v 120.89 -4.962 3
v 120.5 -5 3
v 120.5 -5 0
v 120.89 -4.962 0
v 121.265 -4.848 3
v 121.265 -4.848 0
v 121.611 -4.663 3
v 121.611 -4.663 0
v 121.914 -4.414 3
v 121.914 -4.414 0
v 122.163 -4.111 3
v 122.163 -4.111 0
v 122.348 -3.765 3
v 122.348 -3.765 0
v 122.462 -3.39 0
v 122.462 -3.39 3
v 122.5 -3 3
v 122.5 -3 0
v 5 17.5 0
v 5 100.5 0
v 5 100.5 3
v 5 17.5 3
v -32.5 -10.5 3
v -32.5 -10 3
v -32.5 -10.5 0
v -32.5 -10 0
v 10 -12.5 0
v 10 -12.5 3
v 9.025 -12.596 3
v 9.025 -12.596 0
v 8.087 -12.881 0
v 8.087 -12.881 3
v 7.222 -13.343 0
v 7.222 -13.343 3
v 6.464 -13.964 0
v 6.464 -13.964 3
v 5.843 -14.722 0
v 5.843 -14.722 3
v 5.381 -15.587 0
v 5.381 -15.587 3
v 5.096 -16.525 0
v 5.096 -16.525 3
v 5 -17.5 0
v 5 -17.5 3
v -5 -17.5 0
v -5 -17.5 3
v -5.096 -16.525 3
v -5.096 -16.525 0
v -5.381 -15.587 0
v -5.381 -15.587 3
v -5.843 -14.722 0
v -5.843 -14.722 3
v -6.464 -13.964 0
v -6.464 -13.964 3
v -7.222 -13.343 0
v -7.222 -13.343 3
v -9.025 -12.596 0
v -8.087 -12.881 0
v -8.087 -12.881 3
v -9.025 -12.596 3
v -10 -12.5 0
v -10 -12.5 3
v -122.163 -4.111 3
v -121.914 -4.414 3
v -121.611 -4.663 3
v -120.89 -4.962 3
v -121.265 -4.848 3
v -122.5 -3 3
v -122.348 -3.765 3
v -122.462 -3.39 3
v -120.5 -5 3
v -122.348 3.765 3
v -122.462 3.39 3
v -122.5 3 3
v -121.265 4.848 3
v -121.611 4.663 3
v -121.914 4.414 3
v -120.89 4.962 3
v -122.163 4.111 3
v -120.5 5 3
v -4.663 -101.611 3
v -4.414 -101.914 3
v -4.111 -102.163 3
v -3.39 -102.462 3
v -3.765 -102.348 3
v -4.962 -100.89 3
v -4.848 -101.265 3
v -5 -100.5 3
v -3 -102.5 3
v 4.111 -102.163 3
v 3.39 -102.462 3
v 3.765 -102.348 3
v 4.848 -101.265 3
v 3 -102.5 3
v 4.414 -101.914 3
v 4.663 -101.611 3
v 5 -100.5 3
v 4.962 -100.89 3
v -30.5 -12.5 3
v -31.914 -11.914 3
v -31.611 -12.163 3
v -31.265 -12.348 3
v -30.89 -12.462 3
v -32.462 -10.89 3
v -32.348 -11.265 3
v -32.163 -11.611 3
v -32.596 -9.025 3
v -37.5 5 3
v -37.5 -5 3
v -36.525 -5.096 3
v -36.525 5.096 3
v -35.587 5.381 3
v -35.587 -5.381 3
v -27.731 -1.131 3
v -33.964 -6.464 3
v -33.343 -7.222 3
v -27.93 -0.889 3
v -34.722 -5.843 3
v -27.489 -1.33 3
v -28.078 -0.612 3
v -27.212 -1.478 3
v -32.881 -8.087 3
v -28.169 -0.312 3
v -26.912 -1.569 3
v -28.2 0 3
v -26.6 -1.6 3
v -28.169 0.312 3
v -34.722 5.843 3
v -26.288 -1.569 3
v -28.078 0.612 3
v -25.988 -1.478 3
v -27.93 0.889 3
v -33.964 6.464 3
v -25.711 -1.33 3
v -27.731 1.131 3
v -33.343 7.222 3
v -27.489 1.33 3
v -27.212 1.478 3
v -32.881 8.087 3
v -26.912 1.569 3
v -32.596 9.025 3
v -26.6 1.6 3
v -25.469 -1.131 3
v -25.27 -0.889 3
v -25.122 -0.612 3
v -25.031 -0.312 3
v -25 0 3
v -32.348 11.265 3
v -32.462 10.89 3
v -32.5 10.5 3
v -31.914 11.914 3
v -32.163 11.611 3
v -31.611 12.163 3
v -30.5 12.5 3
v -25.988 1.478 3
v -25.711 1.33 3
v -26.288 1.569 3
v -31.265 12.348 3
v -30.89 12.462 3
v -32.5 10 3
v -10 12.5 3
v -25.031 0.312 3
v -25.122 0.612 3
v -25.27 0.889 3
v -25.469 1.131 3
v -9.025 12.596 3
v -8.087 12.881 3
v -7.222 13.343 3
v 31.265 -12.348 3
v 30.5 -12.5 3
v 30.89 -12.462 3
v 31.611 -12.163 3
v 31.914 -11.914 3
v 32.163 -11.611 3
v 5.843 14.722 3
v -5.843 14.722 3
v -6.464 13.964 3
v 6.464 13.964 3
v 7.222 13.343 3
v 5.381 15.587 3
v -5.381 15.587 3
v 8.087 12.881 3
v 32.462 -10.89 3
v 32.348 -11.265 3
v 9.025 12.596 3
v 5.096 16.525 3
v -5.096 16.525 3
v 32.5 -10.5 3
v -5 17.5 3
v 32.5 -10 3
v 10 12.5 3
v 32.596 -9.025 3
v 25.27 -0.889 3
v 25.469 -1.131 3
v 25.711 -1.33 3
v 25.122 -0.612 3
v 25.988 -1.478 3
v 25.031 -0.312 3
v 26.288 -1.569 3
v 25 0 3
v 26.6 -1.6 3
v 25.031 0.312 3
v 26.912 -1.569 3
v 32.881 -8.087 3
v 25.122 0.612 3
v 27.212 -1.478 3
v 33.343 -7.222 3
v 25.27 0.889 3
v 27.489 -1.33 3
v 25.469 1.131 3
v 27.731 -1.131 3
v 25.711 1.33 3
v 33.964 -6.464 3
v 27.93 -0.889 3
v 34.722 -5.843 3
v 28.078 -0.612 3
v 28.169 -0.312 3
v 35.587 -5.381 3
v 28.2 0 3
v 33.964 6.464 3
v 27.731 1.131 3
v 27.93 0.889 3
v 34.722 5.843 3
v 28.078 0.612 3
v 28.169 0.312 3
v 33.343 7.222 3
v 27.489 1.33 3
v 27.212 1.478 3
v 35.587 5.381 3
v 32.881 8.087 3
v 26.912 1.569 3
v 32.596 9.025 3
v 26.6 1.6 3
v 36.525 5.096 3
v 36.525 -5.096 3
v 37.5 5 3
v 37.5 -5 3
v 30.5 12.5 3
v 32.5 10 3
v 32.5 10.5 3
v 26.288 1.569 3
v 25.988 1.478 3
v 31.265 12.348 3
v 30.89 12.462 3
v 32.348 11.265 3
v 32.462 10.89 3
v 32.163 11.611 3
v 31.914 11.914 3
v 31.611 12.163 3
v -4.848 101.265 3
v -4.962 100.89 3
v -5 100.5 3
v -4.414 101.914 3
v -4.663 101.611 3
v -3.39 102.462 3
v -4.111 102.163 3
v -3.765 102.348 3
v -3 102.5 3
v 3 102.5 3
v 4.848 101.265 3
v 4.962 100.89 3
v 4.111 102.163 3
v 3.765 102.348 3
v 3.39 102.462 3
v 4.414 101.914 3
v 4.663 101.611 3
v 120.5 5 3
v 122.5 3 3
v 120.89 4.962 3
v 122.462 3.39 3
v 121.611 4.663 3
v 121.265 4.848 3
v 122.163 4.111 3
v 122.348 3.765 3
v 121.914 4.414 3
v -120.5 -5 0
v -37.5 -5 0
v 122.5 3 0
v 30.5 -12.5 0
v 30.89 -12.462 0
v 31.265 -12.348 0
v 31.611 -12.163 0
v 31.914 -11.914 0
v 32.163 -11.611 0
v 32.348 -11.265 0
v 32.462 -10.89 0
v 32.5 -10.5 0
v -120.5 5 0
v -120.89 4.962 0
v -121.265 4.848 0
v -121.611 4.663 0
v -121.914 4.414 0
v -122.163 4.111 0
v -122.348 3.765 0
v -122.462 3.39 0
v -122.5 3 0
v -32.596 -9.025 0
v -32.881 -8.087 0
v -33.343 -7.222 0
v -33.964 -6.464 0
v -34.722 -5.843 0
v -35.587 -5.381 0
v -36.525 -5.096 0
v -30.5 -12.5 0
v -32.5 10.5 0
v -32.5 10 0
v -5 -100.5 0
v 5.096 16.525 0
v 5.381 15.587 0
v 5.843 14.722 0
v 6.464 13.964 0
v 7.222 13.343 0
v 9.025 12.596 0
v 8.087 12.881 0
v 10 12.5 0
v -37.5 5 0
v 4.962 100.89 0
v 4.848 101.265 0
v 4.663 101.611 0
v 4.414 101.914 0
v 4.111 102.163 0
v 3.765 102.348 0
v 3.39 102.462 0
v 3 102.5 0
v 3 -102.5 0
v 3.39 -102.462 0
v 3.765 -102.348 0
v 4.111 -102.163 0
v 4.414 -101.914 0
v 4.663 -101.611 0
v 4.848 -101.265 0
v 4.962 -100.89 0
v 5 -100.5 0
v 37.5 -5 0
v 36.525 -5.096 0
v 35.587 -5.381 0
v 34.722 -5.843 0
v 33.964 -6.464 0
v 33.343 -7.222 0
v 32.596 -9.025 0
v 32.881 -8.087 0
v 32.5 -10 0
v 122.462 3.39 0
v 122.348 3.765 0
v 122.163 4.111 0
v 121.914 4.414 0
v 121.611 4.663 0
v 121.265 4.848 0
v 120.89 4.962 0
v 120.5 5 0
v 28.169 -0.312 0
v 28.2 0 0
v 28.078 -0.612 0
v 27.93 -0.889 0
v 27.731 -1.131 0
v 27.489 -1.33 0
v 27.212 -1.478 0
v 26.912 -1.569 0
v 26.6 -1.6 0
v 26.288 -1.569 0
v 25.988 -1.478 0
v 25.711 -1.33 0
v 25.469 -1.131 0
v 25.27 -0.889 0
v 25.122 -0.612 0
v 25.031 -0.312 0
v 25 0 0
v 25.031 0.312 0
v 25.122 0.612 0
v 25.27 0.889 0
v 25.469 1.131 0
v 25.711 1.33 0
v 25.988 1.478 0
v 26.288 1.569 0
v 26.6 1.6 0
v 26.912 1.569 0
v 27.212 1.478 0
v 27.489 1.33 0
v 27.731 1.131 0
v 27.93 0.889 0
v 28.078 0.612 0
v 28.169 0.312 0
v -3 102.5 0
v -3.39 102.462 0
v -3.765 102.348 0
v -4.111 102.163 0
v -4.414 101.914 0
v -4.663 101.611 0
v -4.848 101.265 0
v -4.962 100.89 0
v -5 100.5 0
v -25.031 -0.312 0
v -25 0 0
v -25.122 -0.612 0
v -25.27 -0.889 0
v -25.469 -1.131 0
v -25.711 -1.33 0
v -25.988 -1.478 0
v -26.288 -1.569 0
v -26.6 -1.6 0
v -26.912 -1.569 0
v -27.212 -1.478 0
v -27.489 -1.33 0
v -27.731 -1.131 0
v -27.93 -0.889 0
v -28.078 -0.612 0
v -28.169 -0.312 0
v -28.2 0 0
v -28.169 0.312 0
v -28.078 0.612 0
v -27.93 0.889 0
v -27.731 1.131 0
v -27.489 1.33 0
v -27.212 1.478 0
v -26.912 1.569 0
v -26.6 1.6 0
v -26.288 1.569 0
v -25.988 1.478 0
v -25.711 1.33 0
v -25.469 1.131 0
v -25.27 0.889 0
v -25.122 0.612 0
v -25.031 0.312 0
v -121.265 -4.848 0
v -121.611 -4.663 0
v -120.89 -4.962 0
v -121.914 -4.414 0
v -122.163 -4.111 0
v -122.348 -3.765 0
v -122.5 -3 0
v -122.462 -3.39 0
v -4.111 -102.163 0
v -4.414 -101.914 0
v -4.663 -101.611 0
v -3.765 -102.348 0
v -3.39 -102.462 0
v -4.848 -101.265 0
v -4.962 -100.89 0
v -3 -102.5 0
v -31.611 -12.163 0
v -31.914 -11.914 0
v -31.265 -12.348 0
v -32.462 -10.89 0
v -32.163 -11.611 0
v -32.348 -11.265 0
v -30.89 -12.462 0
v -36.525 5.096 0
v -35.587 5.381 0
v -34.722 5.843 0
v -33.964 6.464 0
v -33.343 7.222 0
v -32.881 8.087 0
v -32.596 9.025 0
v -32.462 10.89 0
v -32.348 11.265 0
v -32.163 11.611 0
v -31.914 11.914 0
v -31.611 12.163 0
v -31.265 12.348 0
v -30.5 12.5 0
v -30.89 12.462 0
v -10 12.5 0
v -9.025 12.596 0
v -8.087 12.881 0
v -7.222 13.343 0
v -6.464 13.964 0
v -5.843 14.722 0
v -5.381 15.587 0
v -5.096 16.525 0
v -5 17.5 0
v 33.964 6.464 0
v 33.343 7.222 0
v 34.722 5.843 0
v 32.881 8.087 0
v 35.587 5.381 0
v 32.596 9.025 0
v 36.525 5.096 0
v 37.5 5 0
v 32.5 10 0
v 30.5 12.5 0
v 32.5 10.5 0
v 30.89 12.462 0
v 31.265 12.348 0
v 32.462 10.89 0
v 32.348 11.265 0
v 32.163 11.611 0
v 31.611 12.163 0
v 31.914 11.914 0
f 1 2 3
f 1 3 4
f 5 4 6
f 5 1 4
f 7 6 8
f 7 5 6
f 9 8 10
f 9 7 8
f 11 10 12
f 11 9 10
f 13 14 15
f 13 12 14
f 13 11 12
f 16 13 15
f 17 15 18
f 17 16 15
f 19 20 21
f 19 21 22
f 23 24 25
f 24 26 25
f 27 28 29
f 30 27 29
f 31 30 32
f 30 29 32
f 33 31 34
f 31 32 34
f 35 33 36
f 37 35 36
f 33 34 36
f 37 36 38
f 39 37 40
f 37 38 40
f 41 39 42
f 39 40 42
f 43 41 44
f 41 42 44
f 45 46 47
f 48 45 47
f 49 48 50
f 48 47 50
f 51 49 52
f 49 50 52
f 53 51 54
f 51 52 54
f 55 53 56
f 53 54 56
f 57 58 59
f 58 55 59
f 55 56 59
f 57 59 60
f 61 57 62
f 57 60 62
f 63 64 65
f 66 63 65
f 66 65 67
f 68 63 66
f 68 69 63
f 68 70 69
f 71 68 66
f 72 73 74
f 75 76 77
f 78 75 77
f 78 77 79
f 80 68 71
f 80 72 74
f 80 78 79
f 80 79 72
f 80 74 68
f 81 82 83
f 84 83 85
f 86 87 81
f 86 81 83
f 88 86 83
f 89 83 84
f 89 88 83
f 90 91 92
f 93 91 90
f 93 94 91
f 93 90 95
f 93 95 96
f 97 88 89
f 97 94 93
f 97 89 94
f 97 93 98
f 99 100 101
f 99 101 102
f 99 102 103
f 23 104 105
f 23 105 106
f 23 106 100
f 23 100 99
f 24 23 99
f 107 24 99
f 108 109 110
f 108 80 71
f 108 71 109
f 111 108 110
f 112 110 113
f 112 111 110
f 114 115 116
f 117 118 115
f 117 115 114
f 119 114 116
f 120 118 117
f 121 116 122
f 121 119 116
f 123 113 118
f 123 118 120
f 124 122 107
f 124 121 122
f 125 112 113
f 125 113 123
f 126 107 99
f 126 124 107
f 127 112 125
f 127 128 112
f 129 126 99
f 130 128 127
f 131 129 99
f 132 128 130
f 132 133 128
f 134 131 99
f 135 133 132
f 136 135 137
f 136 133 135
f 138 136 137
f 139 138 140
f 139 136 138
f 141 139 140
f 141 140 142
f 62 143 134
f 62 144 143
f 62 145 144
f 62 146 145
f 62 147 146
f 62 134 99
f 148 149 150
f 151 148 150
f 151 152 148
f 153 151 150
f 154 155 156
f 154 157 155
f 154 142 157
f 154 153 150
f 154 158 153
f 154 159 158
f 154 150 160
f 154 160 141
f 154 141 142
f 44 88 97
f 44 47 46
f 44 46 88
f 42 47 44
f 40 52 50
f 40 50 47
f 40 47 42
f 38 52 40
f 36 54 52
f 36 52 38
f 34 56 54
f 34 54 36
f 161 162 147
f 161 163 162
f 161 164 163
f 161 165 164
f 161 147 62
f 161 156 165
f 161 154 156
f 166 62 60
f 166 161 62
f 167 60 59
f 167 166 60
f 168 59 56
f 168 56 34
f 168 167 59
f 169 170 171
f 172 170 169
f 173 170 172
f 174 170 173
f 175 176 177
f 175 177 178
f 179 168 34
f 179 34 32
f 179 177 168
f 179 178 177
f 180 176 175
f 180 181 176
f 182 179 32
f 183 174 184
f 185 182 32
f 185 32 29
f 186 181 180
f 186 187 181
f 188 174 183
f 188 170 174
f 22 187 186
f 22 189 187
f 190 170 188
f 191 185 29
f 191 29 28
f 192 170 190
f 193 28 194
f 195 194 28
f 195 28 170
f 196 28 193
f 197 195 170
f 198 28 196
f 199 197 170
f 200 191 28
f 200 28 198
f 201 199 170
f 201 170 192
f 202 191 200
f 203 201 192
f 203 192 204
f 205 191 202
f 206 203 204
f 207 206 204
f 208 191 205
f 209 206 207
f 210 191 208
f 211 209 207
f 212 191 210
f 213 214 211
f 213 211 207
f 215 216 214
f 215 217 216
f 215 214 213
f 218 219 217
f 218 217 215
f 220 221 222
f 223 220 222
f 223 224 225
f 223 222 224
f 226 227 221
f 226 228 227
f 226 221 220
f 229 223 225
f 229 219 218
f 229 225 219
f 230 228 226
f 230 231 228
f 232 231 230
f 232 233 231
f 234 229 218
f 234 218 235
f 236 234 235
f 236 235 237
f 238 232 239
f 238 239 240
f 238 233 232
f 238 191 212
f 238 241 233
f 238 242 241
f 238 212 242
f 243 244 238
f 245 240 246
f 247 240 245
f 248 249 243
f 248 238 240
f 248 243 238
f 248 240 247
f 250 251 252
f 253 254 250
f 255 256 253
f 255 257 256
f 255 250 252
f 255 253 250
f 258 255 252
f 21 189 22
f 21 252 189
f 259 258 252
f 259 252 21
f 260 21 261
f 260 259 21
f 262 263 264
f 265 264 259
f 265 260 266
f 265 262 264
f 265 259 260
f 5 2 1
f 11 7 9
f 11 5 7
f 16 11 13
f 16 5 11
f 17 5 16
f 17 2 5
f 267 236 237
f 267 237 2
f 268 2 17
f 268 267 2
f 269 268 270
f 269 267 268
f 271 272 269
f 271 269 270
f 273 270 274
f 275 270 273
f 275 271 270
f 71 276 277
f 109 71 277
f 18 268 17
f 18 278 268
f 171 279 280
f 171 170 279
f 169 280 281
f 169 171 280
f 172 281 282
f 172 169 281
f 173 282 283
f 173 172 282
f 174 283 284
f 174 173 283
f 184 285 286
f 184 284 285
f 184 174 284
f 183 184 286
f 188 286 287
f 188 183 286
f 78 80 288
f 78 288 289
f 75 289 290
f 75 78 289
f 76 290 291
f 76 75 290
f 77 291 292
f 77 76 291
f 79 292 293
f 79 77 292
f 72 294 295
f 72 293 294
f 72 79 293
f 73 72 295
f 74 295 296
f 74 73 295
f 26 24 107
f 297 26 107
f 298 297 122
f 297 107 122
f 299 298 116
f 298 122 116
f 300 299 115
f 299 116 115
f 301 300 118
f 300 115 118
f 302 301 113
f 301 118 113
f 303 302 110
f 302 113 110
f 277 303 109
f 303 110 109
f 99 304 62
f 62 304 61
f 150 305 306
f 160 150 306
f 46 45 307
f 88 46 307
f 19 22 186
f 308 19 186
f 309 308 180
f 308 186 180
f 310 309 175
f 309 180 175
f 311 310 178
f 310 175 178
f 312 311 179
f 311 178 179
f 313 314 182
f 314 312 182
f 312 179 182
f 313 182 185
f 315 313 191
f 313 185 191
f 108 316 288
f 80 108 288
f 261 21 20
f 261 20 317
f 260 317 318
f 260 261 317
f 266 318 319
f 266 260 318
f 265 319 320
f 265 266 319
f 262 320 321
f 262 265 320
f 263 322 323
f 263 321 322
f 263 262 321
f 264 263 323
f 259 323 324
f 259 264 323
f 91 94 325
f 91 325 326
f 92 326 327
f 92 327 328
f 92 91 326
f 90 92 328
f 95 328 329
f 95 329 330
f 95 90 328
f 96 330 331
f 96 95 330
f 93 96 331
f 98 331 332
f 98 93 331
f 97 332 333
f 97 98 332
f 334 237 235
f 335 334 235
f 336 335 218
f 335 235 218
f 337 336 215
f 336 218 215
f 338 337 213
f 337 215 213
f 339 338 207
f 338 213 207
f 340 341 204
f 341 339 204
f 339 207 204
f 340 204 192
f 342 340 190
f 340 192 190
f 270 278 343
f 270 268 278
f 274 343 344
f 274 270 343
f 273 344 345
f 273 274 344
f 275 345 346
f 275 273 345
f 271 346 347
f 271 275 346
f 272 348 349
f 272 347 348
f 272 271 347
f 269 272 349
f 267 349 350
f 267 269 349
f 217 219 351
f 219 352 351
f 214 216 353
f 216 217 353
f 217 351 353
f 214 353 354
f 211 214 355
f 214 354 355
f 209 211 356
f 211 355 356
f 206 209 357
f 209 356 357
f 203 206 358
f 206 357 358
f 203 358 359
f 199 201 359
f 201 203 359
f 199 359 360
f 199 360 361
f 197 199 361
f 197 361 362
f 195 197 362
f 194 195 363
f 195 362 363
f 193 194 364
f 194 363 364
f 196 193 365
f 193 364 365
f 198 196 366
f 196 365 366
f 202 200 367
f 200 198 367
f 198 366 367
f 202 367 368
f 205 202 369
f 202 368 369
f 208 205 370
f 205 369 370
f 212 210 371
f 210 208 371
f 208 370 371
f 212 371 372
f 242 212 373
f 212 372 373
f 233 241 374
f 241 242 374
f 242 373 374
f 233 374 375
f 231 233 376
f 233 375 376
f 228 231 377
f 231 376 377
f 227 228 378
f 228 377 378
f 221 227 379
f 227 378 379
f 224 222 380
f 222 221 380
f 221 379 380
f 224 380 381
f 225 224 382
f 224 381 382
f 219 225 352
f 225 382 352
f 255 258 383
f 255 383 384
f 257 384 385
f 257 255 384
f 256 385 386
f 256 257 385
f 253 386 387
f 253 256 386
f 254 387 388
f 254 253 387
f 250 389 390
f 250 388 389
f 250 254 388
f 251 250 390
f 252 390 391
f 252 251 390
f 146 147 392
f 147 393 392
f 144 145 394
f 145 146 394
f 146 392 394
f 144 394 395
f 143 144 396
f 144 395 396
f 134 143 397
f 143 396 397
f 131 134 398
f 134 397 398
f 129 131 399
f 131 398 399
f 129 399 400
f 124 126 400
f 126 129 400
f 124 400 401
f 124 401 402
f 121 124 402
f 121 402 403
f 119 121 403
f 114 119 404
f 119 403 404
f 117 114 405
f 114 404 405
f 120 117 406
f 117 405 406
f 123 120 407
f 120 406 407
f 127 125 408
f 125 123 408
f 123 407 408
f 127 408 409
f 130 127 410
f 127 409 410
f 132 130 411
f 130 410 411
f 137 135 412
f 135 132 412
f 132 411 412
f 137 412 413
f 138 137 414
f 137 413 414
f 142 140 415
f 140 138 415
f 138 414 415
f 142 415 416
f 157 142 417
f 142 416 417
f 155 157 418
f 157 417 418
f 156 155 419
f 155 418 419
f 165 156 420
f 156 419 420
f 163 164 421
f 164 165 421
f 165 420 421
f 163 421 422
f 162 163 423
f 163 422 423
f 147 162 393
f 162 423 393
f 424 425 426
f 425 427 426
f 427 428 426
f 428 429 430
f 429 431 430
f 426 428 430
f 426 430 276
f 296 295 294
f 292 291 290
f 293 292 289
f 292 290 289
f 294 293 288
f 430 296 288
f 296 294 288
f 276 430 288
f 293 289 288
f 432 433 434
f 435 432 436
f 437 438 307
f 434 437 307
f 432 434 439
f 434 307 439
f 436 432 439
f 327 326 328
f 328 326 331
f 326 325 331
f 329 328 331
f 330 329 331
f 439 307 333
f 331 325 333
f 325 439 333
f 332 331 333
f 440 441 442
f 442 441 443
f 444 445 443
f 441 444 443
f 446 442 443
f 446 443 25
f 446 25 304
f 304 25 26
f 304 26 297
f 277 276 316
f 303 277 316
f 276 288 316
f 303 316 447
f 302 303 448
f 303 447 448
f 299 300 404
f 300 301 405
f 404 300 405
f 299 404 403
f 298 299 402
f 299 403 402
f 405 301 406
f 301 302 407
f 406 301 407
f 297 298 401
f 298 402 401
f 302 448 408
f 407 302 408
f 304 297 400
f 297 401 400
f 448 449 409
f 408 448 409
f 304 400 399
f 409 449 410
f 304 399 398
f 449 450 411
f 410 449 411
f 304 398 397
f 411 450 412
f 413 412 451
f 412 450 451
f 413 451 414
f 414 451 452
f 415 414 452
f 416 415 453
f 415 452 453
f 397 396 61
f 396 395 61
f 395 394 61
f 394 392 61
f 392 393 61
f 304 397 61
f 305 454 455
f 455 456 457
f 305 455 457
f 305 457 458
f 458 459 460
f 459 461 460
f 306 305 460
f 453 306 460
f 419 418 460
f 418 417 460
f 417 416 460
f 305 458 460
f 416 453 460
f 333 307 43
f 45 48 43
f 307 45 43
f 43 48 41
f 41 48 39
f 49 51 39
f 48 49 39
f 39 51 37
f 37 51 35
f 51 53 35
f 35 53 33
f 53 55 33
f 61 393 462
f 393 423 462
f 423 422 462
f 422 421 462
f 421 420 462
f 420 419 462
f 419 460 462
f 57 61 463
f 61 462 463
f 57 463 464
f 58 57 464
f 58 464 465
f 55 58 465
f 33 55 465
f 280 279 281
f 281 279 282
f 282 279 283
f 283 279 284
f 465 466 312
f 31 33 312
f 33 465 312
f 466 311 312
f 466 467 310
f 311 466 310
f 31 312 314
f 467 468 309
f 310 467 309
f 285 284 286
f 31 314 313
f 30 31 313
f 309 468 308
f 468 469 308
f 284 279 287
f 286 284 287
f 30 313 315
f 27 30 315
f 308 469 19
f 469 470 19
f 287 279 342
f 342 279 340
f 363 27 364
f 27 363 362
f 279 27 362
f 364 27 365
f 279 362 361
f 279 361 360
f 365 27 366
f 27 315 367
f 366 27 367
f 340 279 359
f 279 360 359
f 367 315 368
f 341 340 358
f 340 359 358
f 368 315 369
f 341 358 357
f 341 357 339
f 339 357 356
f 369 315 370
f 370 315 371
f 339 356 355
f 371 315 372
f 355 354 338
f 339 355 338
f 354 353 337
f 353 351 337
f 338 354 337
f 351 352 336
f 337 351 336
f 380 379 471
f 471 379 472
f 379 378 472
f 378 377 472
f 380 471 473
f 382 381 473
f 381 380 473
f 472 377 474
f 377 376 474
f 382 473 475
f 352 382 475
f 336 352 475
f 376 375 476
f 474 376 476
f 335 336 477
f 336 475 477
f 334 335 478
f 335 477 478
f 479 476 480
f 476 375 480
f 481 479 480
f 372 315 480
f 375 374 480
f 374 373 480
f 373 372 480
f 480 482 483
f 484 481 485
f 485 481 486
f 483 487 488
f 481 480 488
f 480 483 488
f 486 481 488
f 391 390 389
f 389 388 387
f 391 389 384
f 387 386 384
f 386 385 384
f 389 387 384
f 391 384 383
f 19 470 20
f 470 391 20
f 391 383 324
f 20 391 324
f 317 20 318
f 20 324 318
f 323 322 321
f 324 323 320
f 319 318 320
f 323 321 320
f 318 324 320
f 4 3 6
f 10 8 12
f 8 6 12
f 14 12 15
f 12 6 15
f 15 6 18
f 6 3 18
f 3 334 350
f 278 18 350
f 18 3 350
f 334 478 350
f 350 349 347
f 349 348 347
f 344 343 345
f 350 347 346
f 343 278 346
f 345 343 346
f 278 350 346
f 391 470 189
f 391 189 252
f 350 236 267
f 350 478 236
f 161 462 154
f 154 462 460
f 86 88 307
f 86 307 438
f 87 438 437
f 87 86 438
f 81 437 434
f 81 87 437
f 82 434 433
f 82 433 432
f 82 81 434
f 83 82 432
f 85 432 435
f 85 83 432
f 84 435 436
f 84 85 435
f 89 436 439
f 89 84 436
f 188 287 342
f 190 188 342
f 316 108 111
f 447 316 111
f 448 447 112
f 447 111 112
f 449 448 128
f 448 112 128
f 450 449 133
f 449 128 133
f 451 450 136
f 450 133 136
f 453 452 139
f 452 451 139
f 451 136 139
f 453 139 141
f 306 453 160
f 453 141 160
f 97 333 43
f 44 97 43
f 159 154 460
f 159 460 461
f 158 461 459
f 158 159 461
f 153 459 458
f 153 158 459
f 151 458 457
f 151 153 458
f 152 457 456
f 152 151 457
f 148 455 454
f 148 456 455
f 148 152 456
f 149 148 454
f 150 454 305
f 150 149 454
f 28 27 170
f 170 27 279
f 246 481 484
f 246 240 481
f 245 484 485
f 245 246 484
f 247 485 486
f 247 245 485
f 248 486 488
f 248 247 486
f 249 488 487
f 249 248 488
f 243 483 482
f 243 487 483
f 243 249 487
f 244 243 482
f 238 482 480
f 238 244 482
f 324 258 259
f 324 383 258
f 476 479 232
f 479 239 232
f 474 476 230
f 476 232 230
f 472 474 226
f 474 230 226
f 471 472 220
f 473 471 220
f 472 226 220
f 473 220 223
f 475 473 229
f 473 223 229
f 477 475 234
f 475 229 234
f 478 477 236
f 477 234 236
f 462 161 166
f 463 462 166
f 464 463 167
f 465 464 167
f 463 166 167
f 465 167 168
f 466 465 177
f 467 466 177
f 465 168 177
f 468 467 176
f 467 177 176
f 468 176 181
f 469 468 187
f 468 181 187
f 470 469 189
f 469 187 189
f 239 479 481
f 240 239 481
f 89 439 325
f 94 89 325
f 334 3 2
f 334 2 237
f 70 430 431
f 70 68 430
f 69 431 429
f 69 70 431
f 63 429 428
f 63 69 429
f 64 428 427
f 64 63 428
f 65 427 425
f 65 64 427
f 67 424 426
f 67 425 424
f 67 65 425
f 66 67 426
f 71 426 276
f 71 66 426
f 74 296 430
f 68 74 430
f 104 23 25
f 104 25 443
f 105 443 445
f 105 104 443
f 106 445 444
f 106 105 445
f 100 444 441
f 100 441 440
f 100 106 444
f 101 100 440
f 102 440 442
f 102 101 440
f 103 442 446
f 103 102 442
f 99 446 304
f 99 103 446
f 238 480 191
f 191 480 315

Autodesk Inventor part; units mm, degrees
ref_plane "YZ Plane" through (0, 0, 0) normal (1, 0, 0) x (0, 1, 0)
ref_plane "XZ Plane" through (0, 0, 0) normal (0, 1, 0) x (-1, 0, 0)
ref_plane "XY Plane" through (0, 0, 0) normal (0, 0, 1) x (1, 0, 0)
sketch "Sketch1" plane through (0, 0, 0) normal (0, 0, 1) x (1, 0, 0)
  line L0 (-32.5, -12.5) -> (32.5, -12.5)
  line L1 (32.5, -12.5) -> (32.5, 12.5)
  line L2 (32.5, 12.5) -> (-32.5, 12.5)
  line L3 (-32.5, 12.5) -> (-32.5, -12.5)
  line L4 (-32.5, -12.5) -> (32.5, 12.5) construction
  line L5 (32.5, -12.5) -> (-32.5, 12.5) construction
  line L6 (32.5, 5) -> (122.5, 5)
  line L7 (122.5, 5) -> (122.5, -5)
  line L8 (122.5, -5) -> (32.5, -5)
  line L9 (-5, 12.5) -> (-5, 102.5)
  line L10 (-5, 102.5) -> (5, 102.5)
  line L11 (5, 102.5) -> (5, 12.5)
  line L12 (-32.5, 5) -> (-122.5, 5)
  line L13 (-122.5, 5) -> (-122.5, -5)
  line L14 (-122.5, -5) -> (-32.5, -5)
  line L15 (-5, -12.5) -> (-5, -102.5)
  line L16 (-5, -102.5) -> (5, -102.5)
  line L17 (5, -102.5) -> (5, -12.5)
  circle A0 centre (-26.6, 0) radius 1.6
  circle A1 centre (26.6, 0) radius 1.6
  line L18 (0, 0) -> (0, 12.5) construction
  line L19 (-26.6, 0) -> (26.6, 0) construction
  dimension "d0" = 90
  dimension "d1" = 53.2
  dimension "d2" = 10
  dimension "d3" = 3.2
  dimension "d4" = 65
  dimension "d5" = 25
  dimension "d6" = 90
extrude "Extrusion1" add sketch "Sketch1" along normal blind 3
fillet "Fillet1" radius 2 12 edges at (32.5, 12.5, 1.5) (5, 102.5, 1.5) (-5, 102.5, 1.5) (-122.5, 5, 1.5) (-122.5, -5, 1.5) (-32.5, 12.5, 1.5) (-32.5, -12.5, 1.5) (-5, -102.5, 1.5) (5, -102.5, 1.5) (32.5, -12.5, 1.5) (122.5, -5, 1.5) (122.5, 5, 1.5)
fillet "Fillet1" radius 5 8 edges at (5, -12.5, 1.5) (-5, -12.5, 1.5) (32.5, -5, 1.5) (32.5, 5, 1.5) (5, 12.5, 1.5) (-5, 12.5, 1.5) (-32.5, -5, 1.5) (-32.5, 5, 1.5)
properties part number "spin_light_tester"
